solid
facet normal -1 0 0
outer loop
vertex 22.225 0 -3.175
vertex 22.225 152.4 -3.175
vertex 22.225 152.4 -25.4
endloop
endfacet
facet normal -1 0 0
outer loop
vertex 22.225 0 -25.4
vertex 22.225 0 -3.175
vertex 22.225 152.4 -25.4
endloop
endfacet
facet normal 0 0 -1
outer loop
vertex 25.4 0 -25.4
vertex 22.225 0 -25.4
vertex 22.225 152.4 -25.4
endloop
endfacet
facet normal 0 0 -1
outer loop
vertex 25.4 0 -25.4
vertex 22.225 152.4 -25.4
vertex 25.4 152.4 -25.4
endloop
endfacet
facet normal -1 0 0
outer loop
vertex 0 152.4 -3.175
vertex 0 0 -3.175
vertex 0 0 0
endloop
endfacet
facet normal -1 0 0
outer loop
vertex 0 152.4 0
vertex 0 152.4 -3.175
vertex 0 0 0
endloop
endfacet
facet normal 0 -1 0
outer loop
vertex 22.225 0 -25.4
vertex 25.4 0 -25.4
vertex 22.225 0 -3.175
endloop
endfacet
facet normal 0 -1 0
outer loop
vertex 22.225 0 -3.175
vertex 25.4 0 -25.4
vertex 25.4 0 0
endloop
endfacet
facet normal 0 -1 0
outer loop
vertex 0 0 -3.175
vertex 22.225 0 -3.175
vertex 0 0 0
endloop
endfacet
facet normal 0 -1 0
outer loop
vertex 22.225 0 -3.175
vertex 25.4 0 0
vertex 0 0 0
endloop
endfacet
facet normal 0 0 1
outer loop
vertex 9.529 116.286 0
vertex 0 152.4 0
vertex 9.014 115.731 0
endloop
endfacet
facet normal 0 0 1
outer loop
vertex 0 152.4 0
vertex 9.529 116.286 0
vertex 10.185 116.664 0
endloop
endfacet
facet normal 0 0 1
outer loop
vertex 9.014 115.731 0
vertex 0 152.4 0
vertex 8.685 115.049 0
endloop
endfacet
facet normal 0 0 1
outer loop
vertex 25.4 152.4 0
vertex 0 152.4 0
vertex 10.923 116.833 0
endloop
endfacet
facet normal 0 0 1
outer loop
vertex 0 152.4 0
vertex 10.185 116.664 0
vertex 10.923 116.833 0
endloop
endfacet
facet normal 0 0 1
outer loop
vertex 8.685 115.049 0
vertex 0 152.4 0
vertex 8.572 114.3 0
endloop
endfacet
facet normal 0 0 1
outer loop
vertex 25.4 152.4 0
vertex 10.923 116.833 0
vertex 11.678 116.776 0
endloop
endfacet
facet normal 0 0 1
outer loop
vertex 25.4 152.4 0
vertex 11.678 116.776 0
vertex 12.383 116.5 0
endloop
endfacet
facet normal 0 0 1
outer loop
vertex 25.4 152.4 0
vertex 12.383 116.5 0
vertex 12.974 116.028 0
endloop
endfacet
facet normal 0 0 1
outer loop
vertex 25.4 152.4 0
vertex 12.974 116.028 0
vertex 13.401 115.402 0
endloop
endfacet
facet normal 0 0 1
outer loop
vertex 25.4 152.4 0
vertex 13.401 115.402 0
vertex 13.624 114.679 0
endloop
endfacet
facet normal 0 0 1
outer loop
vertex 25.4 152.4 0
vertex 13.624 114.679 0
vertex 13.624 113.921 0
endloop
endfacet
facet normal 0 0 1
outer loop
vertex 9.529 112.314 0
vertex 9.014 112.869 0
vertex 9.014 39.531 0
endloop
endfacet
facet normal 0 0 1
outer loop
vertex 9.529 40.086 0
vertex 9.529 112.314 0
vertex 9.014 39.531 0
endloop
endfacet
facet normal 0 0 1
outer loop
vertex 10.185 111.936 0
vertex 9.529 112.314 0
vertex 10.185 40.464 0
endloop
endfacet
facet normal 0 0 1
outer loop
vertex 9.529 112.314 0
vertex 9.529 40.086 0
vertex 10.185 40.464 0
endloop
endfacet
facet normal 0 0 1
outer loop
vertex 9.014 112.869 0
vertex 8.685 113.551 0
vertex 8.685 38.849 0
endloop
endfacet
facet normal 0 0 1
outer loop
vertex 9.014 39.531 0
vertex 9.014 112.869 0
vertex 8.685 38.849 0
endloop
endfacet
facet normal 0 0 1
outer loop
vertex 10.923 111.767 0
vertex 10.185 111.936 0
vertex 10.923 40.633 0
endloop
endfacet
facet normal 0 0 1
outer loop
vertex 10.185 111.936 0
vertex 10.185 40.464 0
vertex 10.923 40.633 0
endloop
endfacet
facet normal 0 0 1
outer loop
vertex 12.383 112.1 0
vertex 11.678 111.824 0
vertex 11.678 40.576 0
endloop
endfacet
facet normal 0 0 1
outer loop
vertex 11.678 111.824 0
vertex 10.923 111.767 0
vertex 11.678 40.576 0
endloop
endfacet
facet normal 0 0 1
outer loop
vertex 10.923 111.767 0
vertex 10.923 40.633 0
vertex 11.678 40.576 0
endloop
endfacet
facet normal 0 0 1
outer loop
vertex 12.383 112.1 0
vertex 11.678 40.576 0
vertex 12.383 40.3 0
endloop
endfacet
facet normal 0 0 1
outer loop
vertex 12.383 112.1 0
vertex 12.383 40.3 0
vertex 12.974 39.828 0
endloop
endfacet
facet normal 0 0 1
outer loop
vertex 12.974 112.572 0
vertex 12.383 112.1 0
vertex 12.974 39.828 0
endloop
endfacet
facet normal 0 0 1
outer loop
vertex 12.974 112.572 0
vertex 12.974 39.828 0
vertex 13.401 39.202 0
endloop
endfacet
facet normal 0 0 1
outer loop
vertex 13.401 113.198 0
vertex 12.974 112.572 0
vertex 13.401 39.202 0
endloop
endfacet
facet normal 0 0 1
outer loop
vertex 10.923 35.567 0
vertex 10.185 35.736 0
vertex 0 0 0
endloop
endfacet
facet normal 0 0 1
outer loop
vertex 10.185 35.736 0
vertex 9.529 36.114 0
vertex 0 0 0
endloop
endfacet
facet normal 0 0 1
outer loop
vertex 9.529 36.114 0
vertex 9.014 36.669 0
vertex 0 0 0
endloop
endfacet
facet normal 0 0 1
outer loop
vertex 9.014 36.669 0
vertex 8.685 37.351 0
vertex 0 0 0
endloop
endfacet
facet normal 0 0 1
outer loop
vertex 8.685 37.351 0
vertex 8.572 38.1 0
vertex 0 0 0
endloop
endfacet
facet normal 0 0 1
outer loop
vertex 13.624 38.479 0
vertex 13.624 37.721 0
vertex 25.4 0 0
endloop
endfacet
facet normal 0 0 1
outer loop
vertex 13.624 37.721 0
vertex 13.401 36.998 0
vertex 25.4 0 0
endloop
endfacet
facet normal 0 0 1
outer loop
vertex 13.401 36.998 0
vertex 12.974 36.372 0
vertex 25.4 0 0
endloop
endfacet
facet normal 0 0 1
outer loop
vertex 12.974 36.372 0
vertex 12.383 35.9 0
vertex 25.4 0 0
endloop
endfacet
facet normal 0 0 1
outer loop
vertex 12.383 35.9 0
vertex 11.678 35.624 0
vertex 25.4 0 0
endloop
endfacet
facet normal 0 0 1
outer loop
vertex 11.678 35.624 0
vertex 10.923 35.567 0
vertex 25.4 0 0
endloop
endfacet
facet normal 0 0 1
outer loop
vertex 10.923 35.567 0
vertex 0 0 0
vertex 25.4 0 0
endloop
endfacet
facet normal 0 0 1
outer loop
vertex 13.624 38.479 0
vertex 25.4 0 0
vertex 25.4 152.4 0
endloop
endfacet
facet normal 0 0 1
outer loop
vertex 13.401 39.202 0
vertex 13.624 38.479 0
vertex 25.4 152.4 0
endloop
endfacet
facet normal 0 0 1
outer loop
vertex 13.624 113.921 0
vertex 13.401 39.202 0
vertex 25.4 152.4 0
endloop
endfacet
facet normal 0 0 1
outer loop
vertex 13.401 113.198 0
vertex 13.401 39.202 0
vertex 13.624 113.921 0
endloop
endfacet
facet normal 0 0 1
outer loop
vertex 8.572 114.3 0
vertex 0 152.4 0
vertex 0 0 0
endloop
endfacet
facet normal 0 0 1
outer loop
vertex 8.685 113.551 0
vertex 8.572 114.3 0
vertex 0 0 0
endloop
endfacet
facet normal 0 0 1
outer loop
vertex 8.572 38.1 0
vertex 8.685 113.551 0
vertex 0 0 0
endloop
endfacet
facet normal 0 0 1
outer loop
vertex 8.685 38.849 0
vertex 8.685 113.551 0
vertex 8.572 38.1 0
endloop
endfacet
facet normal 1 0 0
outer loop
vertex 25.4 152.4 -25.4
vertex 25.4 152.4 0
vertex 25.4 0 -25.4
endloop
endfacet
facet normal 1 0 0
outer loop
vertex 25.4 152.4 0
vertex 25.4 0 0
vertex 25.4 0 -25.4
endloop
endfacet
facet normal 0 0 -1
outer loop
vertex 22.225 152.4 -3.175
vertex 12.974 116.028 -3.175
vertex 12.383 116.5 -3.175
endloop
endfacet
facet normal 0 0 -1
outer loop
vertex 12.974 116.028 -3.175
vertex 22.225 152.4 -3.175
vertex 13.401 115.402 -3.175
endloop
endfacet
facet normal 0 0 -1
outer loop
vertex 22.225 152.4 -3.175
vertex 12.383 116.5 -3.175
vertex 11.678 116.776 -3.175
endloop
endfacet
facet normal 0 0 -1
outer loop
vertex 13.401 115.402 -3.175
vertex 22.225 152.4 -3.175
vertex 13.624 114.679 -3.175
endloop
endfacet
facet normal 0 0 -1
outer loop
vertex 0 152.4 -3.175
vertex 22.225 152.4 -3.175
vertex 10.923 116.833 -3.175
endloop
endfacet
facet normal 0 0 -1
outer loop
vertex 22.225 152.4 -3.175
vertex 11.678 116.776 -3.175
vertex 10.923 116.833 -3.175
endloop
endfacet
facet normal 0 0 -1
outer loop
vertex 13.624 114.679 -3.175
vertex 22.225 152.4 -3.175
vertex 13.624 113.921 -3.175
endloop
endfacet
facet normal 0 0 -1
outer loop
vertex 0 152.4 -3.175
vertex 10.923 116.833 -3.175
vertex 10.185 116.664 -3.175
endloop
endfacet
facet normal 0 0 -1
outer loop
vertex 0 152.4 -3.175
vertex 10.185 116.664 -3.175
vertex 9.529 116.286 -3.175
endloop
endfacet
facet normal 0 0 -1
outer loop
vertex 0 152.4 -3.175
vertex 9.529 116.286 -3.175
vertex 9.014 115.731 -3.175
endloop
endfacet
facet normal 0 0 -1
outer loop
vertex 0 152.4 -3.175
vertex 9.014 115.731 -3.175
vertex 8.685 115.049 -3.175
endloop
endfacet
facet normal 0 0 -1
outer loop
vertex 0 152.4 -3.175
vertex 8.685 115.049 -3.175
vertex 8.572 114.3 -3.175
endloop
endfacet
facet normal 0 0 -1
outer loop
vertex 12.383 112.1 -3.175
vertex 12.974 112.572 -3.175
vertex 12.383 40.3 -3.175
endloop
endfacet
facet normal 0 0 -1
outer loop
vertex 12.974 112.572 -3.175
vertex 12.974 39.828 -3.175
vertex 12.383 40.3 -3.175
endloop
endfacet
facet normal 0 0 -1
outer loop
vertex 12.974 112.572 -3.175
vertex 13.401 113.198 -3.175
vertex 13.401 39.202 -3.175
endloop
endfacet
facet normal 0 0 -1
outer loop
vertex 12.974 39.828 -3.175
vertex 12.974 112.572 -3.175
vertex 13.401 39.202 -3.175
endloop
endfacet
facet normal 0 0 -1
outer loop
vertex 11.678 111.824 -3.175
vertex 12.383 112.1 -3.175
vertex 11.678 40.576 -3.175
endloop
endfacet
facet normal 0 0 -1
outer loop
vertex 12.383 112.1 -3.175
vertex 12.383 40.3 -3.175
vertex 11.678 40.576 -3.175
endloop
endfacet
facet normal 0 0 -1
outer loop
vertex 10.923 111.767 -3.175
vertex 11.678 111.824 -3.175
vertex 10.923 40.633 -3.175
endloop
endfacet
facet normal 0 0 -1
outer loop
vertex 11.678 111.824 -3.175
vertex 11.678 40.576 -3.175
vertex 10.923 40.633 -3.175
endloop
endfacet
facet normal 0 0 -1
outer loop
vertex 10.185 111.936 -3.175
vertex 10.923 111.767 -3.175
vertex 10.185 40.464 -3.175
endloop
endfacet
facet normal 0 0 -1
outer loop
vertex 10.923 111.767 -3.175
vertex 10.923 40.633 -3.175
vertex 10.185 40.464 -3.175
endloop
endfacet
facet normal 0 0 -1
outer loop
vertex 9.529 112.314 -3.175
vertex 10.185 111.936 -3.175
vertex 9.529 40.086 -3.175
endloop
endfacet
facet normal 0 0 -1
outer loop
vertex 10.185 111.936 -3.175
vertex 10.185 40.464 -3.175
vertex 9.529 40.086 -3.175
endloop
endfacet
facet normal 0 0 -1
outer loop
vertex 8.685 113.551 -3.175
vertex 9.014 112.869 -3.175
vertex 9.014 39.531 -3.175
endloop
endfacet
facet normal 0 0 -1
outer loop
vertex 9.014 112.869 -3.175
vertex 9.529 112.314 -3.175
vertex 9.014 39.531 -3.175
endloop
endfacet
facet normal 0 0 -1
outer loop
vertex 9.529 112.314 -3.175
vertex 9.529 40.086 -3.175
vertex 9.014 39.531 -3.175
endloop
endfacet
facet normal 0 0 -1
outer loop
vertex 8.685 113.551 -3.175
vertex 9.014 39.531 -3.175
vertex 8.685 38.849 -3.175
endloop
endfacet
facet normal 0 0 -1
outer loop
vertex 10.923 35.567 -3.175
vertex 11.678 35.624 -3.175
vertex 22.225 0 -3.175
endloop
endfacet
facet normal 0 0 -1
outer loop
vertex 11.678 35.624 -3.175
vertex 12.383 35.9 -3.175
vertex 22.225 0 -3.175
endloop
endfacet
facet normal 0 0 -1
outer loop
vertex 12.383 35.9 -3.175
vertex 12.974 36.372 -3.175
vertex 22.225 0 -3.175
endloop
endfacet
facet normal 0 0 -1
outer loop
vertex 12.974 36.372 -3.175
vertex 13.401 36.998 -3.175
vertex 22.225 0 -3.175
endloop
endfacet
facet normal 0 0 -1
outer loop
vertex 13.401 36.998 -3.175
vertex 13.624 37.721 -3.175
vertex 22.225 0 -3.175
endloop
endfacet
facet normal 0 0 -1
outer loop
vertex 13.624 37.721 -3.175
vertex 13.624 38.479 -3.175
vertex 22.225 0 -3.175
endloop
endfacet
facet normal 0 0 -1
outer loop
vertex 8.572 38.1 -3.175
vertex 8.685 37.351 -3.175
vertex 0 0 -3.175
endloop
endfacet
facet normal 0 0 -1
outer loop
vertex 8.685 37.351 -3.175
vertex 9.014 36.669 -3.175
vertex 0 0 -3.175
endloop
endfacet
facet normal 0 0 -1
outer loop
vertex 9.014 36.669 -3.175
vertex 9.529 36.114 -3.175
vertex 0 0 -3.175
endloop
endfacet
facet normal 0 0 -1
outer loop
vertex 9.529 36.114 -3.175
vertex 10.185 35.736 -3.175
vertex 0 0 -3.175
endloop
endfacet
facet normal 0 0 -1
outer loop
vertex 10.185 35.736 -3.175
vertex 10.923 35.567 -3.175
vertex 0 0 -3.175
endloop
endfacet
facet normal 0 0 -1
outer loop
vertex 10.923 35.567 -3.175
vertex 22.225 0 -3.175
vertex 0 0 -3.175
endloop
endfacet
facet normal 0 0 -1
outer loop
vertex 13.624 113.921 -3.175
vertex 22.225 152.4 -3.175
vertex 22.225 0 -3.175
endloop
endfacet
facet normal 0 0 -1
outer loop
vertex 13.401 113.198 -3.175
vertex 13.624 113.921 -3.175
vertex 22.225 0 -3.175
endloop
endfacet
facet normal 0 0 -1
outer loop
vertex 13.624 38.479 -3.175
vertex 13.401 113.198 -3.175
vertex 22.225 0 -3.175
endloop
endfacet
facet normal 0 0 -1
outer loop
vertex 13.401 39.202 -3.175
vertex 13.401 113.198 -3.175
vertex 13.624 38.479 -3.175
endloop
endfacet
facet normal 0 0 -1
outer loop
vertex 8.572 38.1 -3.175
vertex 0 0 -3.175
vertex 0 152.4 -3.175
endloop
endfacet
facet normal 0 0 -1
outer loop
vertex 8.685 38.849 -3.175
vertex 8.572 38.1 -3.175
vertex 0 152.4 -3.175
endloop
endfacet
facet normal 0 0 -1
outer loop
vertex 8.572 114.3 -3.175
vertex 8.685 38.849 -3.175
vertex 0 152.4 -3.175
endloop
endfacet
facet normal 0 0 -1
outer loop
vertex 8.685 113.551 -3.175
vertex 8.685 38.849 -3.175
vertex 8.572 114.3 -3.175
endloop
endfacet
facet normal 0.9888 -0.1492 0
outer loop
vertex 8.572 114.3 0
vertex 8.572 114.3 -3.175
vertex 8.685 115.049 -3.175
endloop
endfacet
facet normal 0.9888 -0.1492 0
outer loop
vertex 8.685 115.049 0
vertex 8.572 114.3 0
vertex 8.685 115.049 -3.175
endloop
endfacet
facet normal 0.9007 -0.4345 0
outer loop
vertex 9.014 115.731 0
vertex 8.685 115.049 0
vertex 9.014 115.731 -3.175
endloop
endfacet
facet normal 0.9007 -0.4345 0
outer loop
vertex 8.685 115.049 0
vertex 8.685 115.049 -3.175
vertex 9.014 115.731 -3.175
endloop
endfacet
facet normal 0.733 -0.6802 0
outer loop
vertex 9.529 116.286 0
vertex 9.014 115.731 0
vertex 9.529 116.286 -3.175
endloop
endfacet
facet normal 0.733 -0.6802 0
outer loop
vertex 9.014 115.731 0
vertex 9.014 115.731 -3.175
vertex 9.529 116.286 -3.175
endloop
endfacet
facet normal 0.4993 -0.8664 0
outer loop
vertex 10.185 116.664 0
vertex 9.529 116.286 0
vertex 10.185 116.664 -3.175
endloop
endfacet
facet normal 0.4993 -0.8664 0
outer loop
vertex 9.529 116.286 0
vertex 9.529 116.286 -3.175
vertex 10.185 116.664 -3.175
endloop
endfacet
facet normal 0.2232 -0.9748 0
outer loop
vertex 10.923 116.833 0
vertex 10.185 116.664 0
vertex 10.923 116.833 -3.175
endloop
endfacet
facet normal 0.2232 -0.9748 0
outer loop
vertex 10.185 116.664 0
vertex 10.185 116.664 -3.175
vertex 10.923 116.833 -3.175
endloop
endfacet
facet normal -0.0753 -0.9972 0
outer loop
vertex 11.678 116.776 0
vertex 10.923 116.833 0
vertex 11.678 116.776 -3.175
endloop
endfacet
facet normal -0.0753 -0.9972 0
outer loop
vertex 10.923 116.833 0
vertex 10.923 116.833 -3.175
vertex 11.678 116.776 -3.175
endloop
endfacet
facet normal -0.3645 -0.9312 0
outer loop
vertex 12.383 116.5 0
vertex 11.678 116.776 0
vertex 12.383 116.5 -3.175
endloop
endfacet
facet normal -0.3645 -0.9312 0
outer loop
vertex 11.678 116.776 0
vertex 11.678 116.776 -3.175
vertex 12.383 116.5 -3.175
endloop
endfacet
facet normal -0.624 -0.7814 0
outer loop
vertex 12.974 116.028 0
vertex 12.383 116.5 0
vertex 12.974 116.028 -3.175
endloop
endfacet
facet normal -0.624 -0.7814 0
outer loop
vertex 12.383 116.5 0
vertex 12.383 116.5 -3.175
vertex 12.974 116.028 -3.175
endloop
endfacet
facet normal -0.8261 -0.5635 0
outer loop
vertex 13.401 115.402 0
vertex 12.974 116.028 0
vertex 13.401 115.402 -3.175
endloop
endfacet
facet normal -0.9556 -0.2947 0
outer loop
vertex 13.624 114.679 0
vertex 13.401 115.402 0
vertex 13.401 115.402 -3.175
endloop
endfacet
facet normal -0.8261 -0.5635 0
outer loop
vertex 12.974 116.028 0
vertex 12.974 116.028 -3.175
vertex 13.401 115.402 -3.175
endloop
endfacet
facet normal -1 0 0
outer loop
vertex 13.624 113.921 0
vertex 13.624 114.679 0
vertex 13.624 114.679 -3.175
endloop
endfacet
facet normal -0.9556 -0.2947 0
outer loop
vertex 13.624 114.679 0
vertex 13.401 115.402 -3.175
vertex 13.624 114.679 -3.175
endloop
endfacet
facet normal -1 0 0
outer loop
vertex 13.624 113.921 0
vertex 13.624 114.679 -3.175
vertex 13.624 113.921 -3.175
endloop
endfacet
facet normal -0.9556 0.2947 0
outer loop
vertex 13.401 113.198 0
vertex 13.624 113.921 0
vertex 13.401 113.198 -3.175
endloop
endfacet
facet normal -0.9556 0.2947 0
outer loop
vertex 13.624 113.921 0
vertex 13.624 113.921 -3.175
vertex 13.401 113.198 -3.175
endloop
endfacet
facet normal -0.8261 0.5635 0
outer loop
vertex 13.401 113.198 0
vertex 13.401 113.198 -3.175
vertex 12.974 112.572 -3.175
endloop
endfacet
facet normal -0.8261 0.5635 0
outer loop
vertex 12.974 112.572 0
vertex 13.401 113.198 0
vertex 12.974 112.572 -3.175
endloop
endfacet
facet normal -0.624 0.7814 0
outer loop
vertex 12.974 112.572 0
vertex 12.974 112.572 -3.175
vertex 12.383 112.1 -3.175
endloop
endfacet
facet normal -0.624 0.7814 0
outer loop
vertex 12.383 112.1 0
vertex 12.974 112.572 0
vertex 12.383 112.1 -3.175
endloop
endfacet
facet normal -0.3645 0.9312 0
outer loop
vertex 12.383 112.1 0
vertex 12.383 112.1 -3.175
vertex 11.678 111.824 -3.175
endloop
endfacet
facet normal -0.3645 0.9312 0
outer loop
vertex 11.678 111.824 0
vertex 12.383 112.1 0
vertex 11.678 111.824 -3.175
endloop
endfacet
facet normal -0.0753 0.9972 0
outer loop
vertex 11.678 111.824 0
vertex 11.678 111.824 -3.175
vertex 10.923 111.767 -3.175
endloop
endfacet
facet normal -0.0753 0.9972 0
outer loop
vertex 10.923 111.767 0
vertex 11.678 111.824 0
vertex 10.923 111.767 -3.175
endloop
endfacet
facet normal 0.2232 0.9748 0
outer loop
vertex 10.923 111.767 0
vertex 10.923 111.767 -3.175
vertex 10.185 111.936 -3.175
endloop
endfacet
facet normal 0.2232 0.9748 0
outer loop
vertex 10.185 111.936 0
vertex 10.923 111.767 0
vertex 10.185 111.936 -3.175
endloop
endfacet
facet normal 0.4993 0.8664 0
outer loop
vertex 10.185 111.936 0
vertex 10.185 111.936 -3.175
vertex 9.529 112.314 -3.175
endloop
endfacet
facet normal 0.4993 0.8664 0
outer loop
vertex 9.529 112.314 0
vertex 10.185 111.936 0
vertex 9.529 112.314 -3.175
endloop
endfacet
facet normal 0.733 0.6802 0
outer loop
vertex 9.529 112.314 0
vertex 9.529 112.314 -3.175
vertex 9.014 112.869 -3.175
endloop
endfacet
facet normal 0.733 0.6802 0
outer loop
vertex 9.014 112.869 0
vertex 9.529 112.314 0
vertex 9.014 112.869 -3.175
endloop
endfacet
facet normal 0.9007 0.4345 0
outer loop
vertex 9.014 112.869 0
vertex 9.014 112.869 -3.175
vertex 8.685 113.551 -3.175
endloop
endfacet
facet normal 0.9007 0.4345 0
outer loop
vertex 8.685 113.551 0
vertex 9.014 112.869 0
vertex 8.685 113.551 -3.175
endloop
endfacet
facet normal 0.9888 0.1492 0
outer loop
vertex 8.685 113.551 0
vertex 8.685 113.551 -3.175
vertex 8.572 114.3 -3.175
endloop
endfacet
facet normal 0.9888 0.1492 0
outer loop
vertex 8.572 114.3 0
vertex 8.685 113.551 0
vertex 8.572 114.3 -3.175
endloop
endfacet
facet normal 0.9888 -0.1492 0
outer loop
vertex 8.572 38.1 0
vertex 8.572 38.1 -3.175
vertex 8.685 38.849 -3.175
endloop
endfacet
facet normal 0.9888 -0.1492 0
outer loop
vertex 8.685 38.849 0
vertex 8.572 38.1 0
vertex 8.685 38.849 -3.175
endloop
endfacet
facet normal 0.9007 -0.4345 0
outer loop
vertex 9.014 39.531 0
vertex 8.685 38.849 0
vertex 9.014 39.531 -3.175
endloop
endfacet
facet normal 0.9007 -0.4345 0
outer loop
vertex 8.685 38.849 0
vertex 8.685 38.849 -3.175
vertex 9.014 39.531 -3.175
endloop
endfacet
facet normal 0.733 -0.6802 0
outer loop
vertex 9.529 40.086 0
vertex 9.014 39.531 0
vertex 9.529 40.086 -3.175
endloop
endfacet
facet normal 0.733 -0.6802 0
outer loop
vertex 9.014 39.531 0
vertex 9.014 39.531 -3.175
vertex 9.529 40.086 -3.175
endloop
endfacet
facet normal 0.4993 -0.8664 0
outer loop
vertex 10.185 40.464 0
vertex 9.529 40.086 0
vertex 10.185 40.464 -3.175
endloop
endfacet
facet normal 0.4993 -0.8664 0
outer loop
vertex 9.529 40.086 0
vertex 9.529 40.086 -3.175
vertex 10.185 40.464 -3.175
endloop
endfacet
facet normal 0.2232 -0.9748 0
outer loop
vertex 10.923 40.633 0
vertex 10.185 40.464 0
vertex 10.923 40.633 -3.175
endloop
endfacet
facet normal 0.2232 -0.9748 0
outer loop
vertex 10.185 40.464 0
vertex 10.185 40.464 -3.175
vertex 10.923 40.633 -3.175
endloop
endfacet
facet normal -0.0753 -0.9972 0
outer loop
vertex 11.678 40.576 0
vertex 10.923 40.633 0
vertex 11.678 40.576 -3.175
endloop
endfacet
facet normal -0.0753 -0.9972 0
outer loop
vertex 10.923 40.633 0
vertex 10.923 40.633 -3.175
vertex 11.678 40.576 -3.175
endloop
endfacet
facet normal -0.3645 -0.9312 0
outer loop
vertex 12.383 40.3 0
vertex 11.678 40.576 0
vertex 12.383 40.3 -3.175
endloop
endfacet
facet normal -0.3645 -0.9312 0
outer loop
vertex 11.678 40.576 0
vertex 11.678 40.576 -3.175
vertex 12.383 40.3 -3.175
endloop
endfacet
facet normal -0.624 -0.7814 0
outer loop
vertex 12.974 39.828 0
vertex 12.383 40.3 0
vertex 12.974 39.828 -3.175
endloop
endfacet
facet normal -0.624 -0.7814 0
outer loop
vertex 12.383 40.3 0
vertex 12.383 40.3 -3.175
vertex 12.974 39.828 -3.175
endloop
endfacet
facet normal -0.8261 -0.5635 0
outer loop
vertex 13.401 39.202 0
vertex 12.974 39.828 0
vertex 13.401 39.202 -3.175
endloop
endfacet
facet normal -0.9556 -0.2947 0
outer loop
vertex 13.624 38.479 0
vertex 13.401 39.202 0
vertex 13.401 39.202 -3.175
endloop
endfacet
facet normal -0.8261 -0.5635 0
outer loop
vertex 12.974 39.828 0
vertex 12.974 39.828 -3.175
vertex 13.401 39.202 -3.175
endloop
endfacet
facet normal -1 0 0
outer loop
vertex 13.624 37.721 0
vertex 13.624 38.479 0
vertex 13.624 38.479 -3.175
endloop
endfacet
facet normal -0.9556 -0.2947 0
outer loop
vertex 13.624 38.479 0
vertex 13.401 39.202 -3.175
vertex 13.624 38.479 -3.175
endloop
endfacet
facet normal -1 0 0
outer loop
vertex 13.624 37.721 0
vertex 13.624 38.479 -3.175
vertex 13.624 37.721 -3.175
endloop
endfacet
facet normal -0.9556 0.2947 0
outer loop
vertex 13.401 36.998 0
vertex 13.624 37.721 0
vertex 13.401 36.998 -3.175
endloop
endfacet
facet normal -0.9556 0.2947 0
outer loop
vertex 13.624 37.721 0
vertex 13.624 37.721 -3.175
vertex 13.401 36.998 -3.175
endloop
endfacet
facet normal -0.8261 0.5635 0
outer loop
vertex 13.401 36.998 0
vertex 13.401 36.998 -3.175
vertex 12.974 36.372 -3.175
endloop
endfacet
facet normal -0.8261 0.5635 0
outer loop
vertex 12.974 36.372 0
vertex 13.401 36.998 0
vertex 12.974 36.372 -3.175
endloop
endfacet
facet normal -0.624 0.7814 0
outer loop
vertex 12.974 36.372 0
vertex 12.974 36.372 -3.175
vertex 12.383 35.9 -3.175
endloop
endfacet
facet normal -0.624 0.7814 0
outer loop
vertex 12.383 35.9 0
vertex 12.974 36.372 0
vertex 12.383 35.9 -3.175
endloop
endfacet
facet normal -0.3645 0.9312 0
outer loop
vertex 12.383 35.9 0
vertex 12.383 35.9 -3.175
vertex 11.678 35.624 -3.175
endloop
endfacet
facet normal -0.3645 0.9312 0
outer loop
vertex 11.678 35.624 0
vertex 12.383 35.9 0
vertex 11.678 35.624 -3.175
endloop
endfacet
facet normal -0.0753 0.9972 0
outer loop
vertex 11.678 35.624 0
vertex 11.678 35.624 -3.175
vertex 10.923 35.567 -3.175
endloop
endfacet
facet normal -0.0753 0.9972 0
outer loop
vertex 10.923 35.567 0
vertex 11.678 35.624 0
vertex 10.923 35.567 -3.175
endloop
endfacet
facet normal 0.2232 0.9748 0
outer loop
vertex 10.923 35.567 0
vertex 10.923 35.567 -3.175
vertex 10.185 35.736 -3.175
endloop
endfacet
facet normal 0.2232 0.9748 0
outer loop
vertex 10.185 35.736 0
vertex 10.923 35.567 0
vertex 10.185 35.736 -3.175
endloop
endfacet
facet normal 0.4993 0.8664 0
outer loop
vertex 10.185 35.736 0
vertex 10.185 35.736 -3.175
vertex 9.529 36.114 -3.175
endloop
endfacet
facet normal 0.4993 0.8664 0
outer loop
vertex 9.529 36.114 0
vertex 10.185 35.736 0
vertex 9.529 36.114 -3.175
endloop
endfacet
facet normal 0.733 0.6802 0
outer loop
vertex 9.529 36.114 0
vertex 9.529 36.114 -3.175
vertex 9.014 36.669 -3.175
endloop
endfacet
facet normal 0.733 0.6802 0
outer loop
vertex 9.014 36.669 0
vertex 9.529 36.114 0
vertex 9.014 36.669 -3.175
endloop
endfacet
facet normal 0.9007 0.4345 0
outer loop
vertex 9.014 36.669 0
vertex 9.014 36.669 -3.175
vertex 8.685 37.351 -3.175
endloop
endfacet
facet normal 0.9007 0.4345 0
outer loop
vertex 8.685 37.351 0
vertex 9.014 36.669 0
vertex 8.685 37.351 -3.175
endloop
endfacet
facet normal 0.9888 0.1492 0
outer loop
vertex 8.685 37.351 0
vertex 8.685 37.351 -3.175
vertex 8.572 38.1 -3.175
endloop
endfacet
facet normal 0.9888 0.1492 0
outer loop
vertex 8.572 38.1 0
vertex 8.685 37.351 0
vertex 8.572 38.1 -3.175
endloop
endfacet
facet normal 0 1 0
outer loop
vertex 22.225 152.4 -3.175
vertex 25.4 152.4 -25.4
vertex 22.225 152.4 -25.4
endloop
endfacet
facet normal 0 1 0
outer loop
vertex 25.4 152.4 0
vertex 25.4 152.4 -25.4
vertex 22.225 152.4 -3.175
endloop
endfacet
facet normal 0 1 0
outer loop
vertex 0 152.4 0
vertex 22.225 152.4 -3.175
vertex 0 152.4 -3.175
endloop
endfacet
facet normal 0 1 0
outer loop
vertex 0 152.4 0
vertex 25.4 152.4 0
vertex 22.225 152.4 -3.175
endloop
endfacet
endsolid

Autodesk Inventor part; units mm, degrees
ref_plane "YZ Plane" through (0, 0, 0) normal (1, 0, 0) x (0, 1, 0)
ref_plane "XZ Plane" through (0, 0, 0) normal (0, 1, 0) x (-1, 0, 0)
ref_plane "XY Plane" through (0, 0, 0) normal (0, 0, 1) x (1, 0, 0)
sketch "Sketch1" plane through (0, 0, 0) normal (0, 1, 0) x (-1, 0, 0)
  line L0 (0, 0) -> (-25.4, 0)
  line L1 (-25.4, 0) -> (-25.4, -3.175)
  line L2 (-25.4, -3.175) -> (0, -3.175)
  line L3 (0, -3.175) -> (0, 0)
  line L4 (-25.4, 0) -> (-22.225, 0)
  line L5 (-22.225, 0) -> (-22.225, -25.4)
  line L6 (-22.225, -25.4) -> (-25.4, -25.4)
  line L7 (-25.4, -25.4) -> (-25.4, 0)
  dimension "d0" = 25.4
  dimension "d1" = 3.175
  dimension "d2" = 25.4
  dimension "d3" = 3.175
extrude "Extrusion1" add sketch "Sketch1" along normal blind 152.4
sketch "Sketch2" plane through (22.225, 0, -25.4) normal (-1, 0, 0) x (0, 0, 1)
  line L0 (0, 0) -> (12.7, 0)
  line L1 (25.4, 0) -> (0, 0) projected
sketch "Sketch3" plane through (22.225, 0, -3.175) normal (0, 0, -1) x (-1, 0, 0)
  line L0 (0, 0) -> (22.225, 0) projected
  line L1 (22.225, 0) -> (11.1125, 0)
  line L2 (11.1125, 0) -> (11.1125, 38.1)
  line L3 (11.1125, 38.1) -> (11.1125, 114.3)
  circle A0 centre (11.1125, 38.1) radius 2.54
  circle A1 centre (11.1125, 114.3) radius 2.54
  dimension "d6" = 38.1
  dimension "d7" = 76.2
  dimension "d8" = 5.08
extrude "Extrusion2" cut sketch "Sketch3" against normal blind 25.4
properties part number "L Bracket 6in" material "Aluminum 6061"
